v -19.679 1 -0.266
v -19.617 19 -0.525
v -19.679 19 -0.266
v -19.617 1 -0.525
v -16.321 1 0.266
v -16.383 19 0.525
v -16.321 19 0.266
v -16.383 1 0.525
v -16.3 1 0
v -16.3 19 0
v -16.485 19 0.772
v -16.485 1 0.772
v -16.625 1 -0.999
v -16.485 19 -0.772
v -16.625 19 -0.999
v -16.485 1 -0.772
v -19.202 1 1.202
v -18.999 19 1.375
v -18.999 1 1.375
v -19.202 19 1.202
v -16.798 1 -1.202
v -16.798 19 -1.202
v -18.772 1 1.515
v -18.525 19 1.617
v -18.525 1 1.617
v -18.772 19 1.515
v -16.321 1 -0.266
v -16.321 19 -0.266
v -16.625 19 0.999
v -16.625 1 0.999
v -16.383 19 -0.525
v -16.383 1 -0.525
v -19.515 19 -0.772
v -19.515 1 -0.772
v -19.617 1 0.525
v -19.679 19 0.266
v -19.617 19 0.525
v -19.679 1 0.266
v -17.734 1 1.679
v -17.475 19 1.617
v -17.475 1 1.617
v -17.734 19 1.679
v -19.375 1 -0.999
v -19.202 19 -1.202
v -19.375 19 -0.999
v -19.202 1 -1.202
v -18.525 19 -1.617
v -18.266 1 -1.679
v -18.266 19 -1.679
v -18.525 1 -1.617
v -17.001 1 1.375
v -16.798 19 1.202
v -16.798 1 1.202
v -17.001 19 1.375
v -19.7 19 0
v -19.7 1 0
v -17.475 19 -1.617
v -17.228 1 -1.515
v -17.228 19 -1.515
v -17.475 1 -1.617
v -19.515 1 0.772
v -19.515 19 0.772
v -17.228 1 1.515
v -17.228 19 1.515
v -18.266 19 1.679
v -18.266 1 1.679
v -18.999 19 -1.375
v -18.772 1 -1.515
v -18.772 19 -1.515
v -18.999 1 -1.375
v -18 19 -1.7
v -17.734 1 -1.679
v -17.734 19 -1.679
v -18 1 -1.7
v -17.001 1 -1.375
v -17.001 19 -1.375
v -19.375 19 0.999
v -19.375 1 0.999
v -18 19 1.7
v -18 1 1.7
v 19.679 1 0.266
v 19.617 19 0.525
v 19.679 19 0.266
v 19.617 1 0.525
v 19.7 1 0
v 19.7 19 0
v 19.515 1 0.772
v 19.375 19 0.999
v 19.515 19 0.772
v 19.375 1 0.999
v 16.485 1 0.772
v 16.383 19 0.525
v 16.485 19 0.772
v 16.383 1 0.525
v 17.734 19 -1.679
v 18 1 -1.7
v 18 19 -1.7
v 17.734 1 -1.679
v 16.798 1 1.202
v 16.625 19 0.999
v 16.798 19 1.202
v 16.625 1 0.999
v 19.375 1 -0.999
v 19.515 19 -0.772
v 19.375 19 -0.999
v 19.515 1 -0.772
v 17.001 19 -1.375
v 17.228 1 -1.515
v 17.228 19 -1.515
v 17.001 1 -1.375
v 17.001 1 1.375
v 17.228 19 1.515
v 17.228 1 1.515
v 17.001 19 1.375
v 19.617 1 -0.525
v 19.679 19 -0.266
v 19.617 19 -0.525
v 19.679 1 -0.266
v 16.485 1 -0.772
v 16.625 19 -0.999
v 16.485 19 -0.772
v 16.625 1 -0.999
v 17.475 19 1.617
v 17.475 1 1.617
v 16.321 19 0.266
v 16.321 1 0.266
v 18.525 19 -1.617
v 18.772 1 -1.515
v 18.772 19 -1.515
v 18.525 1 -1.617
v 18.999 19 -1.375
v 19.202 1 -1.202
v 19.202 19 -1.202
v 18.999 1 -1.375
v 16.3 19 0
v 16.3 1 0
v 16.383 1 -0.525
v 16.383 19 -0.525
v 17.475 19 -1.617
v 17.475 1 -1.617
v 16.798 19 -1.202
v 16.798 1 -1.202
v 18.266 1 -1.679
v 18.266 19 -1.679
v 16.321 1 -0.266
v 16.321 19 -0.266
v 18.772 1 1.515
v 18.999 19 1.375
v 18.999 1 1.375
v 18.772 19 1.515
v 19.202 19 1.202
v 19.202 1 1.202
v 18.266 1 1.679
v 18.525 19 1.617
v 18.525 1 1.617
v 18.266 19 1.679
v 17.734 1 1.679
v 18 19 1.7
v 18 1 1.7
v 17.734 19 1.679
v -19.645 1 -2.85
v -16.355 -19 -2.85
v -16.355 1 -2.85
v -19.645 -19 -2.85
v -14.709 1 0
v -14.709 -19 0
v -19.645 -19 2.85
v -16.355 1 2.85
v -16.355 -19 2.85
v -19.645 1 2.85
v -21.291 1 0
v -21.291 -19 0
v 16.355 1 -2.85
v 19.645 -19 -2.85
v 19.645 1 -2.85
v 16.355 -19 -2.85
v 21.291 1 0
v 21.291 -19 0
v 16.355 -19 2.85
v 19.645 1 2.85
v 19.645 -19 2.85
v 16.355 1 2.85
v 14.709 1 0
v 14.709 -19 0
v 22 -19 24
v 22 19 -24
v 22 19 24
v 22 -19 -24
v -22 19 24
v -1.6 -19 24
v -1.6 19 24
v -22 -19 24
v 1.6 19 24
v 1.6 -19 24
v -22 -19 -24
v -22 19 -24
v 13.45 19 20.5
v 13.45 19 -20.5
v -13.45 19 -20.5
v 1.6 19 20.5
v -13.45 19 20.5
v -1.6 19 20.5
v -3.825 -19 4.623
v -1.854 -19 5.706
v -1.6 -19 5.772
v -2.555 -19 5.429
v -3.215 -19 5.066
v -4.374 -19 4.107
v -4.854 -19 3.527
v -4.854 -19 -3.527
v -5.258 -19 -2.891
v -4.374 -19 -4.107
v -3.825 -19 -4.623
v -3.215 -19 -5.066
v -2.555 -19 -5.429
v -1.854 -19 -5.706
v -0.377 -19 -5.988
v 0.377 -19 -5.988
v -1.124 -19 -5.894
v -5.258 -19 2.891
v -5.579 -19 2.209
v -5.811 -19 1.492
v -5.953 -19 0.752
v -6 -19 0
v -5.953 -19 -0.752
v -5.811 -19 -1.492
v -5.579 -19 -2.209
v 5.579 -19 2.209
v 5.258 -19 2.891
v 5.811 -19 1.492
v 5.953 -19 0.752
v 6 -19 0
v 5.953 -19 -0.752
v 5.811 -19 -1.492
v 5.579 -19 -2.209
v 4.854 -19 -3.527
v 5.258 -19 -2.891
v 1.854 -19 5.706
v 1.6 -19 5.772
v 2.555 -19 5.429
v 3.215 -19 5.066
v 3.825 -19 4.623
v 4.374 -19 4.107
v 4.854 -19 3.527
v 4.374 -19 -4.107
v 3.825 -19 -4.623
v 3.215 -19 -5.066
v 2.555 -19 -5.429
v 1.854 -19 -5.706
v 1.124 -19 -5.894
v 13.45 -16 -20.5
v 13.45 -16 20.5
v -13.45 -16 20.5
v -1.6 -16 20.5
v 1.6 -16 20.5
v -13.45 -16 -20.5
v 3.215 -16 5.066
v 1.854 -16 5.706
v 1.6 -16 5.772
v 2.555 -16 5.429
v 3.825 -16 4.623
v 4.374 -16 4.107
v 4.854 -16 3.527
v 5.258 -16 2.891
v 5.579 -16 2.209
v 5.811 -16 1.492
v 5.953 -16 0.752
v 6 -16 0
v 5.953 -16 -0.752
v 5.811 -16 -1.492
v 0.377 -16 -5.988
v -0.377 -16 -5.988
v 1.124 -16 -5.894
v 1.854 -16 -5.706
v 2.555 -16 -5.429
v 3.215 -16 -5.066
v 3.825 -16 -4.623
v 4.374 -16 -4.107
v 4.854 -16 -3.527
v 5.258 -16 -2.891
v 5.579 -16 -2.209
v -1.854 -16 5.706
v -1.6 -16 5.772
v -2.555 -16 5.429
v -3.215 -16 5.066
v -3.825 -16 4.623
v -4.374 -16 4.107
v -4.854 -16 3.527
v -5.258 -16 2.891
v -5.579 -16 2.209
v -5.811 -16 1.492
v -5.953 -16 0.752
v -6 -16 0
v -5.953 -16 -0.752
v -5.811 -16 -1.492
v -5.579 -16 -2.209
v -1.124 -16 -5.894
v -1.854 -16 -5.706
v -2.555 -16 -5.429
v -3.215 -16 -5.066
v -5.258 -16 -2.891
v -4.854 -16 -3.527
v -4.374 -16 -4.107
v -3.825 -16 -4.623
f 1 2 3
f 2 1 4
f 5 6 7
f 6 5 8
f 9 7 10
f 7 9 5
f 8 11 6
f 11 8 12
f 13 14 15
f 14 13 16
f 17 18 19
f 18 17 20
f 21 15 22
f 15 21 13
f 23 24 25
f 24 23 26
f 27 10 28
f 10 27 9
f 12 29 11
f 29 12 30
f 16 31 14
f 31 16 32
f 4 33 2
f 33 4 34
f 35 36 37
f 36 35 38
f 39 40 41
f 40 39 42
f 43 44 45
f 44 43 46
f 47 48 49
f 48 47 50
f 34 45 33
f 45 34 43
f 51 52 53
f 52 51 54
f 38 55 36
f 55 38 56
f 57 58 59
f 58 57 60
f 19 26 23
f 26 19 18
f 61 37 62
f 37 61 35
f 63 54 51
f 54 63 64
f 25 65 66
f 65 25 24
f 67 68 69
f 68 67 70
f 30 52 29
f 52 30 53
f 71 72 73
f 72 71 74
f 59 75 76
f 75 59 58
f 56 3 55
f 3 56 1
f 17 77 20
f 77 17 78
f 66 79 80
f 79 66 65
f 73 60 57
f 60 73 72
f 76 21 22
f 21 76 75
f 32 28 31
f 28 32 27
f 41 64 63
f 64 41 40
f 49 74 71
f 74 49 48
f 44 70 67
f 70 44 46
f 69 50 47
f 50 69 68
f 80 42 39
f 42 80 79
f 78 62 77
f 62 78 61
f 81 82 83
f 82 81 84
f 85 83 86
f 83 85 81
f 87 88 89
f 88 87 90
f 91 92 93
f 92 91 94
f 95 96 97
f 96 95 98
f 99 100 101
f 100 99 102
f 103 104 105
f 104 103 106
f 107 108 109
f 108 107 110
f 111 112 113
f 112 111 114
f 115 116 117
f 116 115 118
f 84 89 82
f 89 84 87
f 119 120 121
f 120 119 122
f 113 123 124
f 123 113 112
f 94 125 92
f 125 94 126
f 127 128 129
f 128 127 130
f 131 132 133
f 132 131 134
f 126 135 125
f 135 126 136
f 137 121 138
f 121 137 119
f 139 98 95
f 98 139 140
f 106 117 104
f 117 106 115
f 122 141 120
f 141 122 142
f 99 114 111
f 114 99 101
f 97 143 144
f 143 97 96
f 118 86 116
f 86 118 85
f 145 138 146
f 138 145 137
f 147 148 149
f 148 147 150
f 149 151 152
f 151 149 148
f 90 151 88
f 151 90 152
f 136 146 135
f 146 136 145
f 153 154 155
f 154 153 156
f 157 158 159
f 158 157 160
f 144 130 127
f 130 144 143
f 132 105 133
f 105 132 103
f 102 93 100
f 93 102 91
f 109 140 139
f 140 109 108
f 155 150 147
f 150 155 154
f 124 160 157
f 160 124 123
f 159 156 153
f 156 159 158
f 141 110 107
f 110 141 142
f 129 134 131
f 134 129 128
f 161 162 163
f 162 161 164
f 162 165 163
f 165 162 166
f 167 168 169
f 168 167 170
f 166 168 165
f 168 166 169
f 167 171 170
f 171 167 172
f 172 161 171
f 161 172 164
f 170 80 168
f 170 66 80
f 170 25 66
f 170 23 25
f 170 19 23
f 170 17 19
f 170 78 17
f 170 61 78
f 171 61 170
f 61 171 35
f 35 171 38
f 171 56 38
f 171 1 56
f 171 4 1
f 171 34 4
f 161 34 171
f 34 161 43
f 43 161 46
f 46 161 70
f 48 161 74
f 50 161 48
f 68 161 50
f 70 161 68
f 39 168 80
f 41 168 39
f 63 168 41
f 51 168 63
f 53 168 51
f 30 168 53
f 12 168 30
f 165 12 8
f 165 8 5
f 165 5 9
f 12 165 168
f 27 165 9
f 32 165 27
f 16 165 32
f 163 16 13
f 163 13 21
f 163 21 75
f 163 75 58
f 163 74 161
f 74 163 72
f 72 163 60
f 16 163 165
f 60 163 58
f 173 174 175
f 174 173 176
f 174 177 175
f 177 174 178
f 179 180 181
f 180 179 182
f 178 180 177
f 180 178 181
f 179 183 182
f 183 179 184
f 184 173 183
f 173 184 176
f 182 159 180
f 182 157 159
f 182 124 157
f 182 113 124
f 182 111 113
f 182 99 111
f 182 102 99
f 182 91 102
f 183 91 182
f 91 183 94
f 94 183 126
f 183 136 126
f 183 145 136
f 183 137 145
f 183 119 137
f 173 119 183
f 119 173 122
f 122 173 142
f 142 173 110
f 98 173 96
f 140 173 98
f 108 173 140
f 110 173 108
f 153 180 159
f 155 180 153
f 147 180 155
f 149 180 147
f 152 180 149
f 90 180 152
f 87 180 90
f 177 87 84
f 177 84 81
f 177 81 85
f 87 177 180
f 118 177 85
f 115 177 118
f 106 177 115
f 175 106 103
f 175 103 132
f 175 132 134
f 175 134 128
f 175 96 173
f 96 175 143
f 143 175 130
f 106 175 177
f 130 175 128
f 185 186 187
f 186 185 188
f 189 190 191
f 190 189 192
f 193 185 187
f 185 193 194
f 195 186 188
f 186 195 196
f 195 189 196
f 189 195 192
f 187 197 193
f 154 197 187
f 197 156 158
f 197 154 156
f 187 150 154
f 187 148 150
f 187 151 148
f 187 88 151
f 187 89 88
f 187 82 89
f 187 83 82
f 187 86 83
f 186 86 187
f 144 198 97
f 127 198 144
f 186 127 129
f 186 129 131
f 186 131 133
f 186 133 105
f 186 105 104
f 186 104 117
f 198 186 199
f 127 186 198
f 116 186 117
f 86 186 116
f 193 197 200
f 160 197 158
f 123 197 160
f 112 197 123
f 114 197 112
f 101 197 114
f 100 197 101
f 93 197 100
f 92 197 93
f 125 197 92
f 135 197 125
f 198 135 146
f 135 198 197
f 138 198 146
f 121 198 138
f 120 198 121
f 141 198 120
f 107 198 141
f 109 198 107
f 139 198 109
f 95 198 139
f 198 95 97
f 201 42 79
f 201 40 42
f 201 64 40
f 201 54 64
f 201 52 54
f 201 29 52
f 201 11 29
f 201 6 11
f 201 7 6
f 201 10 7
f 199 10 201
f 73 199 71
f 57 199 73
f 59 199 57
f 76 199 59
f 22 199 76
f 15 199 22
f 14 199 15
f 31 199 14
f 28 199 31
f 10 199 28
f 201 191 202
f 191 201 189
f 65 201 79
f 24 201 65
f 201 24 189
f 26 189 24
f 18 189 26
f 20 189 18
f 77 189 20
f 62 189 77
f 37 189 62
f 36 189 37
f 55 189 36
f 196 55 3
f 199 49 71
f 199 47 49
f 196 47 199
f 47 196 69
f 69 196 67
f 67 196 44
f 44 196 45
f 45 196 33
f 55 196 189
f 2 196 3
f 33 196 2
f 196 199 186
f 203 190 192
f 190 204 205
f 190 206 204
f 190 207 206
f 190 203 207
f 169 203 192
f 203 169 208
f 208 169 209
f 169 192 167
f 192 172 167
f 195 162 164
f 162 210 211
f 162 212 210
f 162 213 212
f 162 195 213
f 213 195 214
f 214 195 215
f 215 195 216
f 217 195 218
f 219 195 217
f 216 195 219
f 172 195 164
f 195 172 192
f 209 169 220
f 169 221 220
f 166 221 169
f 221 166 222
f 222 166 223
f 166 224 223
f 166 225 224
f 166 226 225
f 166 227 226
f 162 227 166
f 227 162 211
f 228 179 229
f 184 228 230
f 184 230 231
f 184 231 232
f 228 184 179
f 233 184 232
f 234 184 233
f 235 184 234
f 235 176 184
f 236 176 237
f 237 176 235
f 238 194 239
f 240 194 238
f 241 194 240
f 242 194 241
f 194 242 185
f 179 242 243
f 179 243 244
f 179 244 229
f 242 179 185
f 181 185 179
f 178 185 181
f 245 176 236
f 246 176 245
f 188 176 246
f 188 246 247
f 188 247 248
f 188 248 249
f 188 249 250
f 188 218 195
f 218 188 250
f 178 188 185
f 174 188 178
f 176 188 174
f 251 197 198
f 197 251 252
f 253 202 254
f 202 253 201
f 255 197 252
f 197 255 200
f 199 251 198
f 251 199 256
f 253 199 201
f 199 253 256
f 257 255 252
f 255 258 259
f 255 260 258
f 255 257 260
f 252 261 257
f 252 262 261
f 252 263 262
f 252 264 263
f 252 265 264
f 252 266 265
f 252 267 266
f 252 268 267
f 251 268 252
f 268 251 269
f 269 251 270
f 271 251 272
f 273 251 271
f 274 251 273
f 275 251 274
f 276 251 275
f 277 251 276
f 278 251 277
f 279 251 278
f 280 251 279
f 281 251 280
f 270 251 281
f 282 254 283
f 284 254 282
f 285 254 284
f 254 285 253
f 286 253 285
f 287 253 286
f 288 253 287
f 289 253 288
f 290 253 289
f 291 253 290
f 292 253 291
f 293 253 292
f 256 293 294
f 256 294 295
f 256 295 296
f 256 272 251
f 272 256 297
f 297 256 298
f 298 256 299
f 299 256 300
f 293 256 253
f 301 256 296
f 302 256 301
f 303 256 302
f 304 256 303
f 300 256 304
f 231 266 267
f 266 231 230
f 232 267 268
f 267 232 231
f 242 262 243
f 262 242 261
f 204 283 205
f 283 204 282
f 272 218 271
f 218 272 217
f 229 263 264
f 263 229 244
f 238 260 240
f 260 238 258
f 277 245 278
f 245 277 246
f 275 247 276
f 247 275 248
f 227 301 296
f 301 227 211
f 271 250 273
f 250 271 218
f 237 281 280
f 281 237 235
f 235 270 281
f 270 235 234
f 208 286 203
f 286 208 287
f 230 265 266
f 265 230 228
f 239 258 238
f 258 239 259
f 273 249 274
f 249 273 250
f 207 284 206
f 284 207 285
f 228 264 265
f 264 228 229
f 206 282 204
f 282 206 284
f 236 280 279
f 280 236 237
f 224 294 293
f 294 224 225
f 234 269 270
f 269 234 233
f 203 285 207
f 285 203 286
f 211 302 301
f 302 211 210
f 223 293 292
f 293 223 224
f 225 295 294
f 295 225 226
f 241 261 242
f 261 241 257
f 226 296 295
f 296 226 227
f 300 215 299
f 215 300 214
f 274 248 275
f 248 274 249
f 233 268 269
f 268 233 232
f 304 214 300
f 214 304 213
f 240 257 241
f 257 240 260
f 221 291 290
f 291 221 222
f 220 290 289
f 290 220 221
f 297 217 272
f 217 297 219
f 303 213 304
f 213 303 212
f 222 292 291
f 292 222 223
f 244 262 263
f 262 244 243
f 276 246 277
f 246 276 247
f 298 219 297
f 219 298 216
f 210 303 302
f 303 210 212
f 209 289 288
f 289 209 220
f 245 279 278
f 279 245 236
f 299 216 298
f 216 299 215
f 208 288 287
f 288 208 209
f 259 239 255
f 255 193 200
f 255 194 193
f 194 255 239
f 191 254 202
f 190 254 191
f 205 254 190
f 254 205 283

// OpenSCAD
radial_clearance = 0.2;

jack_wing_width = 44;
jack_width = 26.7+radial_clearance;
jack_height = 41;

screw_sep = 36;

extra_height = 20;

difference()
{
    union()
    {
        cube([44,18+extra_height,48],center=true);
    }
    
    translate([0,3,0])
    cube([jack_width,18+extra_height,jack_height],center=true);
    
    for (i=[-1,1])
    translate([i*screw_sep/2,0,0])
    rotate([90,0,0])
    cylinder(h=26+extra_height,d=3.4,center=true,$fn=40);
    
    cornerdiameter =  ((5.54+0.16) / 2) / cos (180 / 6);
    for (i=[-1,1])
    translate([i*screw_sep/2,-(18+extra_height)/2+extra_height,0])
    rotate([90,0,0])
    cylinder(h=26+extra_height,r=cornerdiameter,center=false,$fn=6);
    
    rotate([90,0,0])
    cylinder(center=true,d=12,h=20+extra_height,$fn=50);
    
    translate([0,0,48/2])
    cube([3.2,20+extra_height,48],center=true);
}

module stretched_cylinder(d, h, stretch, center=false)
{
  if (center)
    stretched_cylinder_geom(d=d, h=h, stretch=stretch);
  else
    translate([0,0,h/2])
    stretched_cylinder_geom(d=d, h=h, stretch=stretch);
}

module stretched_cylinder_geom(d, h, stretch)
{
    union()
    {
        translate([stretch/2,0,0])
        cylinder(d=d,h=h,center=true);
        
        translate([-stretch/2,0,0])
        cylinder(d=d,h=h,center=true);
        
        cube([stretch,d,h],center=true);
    }
}
